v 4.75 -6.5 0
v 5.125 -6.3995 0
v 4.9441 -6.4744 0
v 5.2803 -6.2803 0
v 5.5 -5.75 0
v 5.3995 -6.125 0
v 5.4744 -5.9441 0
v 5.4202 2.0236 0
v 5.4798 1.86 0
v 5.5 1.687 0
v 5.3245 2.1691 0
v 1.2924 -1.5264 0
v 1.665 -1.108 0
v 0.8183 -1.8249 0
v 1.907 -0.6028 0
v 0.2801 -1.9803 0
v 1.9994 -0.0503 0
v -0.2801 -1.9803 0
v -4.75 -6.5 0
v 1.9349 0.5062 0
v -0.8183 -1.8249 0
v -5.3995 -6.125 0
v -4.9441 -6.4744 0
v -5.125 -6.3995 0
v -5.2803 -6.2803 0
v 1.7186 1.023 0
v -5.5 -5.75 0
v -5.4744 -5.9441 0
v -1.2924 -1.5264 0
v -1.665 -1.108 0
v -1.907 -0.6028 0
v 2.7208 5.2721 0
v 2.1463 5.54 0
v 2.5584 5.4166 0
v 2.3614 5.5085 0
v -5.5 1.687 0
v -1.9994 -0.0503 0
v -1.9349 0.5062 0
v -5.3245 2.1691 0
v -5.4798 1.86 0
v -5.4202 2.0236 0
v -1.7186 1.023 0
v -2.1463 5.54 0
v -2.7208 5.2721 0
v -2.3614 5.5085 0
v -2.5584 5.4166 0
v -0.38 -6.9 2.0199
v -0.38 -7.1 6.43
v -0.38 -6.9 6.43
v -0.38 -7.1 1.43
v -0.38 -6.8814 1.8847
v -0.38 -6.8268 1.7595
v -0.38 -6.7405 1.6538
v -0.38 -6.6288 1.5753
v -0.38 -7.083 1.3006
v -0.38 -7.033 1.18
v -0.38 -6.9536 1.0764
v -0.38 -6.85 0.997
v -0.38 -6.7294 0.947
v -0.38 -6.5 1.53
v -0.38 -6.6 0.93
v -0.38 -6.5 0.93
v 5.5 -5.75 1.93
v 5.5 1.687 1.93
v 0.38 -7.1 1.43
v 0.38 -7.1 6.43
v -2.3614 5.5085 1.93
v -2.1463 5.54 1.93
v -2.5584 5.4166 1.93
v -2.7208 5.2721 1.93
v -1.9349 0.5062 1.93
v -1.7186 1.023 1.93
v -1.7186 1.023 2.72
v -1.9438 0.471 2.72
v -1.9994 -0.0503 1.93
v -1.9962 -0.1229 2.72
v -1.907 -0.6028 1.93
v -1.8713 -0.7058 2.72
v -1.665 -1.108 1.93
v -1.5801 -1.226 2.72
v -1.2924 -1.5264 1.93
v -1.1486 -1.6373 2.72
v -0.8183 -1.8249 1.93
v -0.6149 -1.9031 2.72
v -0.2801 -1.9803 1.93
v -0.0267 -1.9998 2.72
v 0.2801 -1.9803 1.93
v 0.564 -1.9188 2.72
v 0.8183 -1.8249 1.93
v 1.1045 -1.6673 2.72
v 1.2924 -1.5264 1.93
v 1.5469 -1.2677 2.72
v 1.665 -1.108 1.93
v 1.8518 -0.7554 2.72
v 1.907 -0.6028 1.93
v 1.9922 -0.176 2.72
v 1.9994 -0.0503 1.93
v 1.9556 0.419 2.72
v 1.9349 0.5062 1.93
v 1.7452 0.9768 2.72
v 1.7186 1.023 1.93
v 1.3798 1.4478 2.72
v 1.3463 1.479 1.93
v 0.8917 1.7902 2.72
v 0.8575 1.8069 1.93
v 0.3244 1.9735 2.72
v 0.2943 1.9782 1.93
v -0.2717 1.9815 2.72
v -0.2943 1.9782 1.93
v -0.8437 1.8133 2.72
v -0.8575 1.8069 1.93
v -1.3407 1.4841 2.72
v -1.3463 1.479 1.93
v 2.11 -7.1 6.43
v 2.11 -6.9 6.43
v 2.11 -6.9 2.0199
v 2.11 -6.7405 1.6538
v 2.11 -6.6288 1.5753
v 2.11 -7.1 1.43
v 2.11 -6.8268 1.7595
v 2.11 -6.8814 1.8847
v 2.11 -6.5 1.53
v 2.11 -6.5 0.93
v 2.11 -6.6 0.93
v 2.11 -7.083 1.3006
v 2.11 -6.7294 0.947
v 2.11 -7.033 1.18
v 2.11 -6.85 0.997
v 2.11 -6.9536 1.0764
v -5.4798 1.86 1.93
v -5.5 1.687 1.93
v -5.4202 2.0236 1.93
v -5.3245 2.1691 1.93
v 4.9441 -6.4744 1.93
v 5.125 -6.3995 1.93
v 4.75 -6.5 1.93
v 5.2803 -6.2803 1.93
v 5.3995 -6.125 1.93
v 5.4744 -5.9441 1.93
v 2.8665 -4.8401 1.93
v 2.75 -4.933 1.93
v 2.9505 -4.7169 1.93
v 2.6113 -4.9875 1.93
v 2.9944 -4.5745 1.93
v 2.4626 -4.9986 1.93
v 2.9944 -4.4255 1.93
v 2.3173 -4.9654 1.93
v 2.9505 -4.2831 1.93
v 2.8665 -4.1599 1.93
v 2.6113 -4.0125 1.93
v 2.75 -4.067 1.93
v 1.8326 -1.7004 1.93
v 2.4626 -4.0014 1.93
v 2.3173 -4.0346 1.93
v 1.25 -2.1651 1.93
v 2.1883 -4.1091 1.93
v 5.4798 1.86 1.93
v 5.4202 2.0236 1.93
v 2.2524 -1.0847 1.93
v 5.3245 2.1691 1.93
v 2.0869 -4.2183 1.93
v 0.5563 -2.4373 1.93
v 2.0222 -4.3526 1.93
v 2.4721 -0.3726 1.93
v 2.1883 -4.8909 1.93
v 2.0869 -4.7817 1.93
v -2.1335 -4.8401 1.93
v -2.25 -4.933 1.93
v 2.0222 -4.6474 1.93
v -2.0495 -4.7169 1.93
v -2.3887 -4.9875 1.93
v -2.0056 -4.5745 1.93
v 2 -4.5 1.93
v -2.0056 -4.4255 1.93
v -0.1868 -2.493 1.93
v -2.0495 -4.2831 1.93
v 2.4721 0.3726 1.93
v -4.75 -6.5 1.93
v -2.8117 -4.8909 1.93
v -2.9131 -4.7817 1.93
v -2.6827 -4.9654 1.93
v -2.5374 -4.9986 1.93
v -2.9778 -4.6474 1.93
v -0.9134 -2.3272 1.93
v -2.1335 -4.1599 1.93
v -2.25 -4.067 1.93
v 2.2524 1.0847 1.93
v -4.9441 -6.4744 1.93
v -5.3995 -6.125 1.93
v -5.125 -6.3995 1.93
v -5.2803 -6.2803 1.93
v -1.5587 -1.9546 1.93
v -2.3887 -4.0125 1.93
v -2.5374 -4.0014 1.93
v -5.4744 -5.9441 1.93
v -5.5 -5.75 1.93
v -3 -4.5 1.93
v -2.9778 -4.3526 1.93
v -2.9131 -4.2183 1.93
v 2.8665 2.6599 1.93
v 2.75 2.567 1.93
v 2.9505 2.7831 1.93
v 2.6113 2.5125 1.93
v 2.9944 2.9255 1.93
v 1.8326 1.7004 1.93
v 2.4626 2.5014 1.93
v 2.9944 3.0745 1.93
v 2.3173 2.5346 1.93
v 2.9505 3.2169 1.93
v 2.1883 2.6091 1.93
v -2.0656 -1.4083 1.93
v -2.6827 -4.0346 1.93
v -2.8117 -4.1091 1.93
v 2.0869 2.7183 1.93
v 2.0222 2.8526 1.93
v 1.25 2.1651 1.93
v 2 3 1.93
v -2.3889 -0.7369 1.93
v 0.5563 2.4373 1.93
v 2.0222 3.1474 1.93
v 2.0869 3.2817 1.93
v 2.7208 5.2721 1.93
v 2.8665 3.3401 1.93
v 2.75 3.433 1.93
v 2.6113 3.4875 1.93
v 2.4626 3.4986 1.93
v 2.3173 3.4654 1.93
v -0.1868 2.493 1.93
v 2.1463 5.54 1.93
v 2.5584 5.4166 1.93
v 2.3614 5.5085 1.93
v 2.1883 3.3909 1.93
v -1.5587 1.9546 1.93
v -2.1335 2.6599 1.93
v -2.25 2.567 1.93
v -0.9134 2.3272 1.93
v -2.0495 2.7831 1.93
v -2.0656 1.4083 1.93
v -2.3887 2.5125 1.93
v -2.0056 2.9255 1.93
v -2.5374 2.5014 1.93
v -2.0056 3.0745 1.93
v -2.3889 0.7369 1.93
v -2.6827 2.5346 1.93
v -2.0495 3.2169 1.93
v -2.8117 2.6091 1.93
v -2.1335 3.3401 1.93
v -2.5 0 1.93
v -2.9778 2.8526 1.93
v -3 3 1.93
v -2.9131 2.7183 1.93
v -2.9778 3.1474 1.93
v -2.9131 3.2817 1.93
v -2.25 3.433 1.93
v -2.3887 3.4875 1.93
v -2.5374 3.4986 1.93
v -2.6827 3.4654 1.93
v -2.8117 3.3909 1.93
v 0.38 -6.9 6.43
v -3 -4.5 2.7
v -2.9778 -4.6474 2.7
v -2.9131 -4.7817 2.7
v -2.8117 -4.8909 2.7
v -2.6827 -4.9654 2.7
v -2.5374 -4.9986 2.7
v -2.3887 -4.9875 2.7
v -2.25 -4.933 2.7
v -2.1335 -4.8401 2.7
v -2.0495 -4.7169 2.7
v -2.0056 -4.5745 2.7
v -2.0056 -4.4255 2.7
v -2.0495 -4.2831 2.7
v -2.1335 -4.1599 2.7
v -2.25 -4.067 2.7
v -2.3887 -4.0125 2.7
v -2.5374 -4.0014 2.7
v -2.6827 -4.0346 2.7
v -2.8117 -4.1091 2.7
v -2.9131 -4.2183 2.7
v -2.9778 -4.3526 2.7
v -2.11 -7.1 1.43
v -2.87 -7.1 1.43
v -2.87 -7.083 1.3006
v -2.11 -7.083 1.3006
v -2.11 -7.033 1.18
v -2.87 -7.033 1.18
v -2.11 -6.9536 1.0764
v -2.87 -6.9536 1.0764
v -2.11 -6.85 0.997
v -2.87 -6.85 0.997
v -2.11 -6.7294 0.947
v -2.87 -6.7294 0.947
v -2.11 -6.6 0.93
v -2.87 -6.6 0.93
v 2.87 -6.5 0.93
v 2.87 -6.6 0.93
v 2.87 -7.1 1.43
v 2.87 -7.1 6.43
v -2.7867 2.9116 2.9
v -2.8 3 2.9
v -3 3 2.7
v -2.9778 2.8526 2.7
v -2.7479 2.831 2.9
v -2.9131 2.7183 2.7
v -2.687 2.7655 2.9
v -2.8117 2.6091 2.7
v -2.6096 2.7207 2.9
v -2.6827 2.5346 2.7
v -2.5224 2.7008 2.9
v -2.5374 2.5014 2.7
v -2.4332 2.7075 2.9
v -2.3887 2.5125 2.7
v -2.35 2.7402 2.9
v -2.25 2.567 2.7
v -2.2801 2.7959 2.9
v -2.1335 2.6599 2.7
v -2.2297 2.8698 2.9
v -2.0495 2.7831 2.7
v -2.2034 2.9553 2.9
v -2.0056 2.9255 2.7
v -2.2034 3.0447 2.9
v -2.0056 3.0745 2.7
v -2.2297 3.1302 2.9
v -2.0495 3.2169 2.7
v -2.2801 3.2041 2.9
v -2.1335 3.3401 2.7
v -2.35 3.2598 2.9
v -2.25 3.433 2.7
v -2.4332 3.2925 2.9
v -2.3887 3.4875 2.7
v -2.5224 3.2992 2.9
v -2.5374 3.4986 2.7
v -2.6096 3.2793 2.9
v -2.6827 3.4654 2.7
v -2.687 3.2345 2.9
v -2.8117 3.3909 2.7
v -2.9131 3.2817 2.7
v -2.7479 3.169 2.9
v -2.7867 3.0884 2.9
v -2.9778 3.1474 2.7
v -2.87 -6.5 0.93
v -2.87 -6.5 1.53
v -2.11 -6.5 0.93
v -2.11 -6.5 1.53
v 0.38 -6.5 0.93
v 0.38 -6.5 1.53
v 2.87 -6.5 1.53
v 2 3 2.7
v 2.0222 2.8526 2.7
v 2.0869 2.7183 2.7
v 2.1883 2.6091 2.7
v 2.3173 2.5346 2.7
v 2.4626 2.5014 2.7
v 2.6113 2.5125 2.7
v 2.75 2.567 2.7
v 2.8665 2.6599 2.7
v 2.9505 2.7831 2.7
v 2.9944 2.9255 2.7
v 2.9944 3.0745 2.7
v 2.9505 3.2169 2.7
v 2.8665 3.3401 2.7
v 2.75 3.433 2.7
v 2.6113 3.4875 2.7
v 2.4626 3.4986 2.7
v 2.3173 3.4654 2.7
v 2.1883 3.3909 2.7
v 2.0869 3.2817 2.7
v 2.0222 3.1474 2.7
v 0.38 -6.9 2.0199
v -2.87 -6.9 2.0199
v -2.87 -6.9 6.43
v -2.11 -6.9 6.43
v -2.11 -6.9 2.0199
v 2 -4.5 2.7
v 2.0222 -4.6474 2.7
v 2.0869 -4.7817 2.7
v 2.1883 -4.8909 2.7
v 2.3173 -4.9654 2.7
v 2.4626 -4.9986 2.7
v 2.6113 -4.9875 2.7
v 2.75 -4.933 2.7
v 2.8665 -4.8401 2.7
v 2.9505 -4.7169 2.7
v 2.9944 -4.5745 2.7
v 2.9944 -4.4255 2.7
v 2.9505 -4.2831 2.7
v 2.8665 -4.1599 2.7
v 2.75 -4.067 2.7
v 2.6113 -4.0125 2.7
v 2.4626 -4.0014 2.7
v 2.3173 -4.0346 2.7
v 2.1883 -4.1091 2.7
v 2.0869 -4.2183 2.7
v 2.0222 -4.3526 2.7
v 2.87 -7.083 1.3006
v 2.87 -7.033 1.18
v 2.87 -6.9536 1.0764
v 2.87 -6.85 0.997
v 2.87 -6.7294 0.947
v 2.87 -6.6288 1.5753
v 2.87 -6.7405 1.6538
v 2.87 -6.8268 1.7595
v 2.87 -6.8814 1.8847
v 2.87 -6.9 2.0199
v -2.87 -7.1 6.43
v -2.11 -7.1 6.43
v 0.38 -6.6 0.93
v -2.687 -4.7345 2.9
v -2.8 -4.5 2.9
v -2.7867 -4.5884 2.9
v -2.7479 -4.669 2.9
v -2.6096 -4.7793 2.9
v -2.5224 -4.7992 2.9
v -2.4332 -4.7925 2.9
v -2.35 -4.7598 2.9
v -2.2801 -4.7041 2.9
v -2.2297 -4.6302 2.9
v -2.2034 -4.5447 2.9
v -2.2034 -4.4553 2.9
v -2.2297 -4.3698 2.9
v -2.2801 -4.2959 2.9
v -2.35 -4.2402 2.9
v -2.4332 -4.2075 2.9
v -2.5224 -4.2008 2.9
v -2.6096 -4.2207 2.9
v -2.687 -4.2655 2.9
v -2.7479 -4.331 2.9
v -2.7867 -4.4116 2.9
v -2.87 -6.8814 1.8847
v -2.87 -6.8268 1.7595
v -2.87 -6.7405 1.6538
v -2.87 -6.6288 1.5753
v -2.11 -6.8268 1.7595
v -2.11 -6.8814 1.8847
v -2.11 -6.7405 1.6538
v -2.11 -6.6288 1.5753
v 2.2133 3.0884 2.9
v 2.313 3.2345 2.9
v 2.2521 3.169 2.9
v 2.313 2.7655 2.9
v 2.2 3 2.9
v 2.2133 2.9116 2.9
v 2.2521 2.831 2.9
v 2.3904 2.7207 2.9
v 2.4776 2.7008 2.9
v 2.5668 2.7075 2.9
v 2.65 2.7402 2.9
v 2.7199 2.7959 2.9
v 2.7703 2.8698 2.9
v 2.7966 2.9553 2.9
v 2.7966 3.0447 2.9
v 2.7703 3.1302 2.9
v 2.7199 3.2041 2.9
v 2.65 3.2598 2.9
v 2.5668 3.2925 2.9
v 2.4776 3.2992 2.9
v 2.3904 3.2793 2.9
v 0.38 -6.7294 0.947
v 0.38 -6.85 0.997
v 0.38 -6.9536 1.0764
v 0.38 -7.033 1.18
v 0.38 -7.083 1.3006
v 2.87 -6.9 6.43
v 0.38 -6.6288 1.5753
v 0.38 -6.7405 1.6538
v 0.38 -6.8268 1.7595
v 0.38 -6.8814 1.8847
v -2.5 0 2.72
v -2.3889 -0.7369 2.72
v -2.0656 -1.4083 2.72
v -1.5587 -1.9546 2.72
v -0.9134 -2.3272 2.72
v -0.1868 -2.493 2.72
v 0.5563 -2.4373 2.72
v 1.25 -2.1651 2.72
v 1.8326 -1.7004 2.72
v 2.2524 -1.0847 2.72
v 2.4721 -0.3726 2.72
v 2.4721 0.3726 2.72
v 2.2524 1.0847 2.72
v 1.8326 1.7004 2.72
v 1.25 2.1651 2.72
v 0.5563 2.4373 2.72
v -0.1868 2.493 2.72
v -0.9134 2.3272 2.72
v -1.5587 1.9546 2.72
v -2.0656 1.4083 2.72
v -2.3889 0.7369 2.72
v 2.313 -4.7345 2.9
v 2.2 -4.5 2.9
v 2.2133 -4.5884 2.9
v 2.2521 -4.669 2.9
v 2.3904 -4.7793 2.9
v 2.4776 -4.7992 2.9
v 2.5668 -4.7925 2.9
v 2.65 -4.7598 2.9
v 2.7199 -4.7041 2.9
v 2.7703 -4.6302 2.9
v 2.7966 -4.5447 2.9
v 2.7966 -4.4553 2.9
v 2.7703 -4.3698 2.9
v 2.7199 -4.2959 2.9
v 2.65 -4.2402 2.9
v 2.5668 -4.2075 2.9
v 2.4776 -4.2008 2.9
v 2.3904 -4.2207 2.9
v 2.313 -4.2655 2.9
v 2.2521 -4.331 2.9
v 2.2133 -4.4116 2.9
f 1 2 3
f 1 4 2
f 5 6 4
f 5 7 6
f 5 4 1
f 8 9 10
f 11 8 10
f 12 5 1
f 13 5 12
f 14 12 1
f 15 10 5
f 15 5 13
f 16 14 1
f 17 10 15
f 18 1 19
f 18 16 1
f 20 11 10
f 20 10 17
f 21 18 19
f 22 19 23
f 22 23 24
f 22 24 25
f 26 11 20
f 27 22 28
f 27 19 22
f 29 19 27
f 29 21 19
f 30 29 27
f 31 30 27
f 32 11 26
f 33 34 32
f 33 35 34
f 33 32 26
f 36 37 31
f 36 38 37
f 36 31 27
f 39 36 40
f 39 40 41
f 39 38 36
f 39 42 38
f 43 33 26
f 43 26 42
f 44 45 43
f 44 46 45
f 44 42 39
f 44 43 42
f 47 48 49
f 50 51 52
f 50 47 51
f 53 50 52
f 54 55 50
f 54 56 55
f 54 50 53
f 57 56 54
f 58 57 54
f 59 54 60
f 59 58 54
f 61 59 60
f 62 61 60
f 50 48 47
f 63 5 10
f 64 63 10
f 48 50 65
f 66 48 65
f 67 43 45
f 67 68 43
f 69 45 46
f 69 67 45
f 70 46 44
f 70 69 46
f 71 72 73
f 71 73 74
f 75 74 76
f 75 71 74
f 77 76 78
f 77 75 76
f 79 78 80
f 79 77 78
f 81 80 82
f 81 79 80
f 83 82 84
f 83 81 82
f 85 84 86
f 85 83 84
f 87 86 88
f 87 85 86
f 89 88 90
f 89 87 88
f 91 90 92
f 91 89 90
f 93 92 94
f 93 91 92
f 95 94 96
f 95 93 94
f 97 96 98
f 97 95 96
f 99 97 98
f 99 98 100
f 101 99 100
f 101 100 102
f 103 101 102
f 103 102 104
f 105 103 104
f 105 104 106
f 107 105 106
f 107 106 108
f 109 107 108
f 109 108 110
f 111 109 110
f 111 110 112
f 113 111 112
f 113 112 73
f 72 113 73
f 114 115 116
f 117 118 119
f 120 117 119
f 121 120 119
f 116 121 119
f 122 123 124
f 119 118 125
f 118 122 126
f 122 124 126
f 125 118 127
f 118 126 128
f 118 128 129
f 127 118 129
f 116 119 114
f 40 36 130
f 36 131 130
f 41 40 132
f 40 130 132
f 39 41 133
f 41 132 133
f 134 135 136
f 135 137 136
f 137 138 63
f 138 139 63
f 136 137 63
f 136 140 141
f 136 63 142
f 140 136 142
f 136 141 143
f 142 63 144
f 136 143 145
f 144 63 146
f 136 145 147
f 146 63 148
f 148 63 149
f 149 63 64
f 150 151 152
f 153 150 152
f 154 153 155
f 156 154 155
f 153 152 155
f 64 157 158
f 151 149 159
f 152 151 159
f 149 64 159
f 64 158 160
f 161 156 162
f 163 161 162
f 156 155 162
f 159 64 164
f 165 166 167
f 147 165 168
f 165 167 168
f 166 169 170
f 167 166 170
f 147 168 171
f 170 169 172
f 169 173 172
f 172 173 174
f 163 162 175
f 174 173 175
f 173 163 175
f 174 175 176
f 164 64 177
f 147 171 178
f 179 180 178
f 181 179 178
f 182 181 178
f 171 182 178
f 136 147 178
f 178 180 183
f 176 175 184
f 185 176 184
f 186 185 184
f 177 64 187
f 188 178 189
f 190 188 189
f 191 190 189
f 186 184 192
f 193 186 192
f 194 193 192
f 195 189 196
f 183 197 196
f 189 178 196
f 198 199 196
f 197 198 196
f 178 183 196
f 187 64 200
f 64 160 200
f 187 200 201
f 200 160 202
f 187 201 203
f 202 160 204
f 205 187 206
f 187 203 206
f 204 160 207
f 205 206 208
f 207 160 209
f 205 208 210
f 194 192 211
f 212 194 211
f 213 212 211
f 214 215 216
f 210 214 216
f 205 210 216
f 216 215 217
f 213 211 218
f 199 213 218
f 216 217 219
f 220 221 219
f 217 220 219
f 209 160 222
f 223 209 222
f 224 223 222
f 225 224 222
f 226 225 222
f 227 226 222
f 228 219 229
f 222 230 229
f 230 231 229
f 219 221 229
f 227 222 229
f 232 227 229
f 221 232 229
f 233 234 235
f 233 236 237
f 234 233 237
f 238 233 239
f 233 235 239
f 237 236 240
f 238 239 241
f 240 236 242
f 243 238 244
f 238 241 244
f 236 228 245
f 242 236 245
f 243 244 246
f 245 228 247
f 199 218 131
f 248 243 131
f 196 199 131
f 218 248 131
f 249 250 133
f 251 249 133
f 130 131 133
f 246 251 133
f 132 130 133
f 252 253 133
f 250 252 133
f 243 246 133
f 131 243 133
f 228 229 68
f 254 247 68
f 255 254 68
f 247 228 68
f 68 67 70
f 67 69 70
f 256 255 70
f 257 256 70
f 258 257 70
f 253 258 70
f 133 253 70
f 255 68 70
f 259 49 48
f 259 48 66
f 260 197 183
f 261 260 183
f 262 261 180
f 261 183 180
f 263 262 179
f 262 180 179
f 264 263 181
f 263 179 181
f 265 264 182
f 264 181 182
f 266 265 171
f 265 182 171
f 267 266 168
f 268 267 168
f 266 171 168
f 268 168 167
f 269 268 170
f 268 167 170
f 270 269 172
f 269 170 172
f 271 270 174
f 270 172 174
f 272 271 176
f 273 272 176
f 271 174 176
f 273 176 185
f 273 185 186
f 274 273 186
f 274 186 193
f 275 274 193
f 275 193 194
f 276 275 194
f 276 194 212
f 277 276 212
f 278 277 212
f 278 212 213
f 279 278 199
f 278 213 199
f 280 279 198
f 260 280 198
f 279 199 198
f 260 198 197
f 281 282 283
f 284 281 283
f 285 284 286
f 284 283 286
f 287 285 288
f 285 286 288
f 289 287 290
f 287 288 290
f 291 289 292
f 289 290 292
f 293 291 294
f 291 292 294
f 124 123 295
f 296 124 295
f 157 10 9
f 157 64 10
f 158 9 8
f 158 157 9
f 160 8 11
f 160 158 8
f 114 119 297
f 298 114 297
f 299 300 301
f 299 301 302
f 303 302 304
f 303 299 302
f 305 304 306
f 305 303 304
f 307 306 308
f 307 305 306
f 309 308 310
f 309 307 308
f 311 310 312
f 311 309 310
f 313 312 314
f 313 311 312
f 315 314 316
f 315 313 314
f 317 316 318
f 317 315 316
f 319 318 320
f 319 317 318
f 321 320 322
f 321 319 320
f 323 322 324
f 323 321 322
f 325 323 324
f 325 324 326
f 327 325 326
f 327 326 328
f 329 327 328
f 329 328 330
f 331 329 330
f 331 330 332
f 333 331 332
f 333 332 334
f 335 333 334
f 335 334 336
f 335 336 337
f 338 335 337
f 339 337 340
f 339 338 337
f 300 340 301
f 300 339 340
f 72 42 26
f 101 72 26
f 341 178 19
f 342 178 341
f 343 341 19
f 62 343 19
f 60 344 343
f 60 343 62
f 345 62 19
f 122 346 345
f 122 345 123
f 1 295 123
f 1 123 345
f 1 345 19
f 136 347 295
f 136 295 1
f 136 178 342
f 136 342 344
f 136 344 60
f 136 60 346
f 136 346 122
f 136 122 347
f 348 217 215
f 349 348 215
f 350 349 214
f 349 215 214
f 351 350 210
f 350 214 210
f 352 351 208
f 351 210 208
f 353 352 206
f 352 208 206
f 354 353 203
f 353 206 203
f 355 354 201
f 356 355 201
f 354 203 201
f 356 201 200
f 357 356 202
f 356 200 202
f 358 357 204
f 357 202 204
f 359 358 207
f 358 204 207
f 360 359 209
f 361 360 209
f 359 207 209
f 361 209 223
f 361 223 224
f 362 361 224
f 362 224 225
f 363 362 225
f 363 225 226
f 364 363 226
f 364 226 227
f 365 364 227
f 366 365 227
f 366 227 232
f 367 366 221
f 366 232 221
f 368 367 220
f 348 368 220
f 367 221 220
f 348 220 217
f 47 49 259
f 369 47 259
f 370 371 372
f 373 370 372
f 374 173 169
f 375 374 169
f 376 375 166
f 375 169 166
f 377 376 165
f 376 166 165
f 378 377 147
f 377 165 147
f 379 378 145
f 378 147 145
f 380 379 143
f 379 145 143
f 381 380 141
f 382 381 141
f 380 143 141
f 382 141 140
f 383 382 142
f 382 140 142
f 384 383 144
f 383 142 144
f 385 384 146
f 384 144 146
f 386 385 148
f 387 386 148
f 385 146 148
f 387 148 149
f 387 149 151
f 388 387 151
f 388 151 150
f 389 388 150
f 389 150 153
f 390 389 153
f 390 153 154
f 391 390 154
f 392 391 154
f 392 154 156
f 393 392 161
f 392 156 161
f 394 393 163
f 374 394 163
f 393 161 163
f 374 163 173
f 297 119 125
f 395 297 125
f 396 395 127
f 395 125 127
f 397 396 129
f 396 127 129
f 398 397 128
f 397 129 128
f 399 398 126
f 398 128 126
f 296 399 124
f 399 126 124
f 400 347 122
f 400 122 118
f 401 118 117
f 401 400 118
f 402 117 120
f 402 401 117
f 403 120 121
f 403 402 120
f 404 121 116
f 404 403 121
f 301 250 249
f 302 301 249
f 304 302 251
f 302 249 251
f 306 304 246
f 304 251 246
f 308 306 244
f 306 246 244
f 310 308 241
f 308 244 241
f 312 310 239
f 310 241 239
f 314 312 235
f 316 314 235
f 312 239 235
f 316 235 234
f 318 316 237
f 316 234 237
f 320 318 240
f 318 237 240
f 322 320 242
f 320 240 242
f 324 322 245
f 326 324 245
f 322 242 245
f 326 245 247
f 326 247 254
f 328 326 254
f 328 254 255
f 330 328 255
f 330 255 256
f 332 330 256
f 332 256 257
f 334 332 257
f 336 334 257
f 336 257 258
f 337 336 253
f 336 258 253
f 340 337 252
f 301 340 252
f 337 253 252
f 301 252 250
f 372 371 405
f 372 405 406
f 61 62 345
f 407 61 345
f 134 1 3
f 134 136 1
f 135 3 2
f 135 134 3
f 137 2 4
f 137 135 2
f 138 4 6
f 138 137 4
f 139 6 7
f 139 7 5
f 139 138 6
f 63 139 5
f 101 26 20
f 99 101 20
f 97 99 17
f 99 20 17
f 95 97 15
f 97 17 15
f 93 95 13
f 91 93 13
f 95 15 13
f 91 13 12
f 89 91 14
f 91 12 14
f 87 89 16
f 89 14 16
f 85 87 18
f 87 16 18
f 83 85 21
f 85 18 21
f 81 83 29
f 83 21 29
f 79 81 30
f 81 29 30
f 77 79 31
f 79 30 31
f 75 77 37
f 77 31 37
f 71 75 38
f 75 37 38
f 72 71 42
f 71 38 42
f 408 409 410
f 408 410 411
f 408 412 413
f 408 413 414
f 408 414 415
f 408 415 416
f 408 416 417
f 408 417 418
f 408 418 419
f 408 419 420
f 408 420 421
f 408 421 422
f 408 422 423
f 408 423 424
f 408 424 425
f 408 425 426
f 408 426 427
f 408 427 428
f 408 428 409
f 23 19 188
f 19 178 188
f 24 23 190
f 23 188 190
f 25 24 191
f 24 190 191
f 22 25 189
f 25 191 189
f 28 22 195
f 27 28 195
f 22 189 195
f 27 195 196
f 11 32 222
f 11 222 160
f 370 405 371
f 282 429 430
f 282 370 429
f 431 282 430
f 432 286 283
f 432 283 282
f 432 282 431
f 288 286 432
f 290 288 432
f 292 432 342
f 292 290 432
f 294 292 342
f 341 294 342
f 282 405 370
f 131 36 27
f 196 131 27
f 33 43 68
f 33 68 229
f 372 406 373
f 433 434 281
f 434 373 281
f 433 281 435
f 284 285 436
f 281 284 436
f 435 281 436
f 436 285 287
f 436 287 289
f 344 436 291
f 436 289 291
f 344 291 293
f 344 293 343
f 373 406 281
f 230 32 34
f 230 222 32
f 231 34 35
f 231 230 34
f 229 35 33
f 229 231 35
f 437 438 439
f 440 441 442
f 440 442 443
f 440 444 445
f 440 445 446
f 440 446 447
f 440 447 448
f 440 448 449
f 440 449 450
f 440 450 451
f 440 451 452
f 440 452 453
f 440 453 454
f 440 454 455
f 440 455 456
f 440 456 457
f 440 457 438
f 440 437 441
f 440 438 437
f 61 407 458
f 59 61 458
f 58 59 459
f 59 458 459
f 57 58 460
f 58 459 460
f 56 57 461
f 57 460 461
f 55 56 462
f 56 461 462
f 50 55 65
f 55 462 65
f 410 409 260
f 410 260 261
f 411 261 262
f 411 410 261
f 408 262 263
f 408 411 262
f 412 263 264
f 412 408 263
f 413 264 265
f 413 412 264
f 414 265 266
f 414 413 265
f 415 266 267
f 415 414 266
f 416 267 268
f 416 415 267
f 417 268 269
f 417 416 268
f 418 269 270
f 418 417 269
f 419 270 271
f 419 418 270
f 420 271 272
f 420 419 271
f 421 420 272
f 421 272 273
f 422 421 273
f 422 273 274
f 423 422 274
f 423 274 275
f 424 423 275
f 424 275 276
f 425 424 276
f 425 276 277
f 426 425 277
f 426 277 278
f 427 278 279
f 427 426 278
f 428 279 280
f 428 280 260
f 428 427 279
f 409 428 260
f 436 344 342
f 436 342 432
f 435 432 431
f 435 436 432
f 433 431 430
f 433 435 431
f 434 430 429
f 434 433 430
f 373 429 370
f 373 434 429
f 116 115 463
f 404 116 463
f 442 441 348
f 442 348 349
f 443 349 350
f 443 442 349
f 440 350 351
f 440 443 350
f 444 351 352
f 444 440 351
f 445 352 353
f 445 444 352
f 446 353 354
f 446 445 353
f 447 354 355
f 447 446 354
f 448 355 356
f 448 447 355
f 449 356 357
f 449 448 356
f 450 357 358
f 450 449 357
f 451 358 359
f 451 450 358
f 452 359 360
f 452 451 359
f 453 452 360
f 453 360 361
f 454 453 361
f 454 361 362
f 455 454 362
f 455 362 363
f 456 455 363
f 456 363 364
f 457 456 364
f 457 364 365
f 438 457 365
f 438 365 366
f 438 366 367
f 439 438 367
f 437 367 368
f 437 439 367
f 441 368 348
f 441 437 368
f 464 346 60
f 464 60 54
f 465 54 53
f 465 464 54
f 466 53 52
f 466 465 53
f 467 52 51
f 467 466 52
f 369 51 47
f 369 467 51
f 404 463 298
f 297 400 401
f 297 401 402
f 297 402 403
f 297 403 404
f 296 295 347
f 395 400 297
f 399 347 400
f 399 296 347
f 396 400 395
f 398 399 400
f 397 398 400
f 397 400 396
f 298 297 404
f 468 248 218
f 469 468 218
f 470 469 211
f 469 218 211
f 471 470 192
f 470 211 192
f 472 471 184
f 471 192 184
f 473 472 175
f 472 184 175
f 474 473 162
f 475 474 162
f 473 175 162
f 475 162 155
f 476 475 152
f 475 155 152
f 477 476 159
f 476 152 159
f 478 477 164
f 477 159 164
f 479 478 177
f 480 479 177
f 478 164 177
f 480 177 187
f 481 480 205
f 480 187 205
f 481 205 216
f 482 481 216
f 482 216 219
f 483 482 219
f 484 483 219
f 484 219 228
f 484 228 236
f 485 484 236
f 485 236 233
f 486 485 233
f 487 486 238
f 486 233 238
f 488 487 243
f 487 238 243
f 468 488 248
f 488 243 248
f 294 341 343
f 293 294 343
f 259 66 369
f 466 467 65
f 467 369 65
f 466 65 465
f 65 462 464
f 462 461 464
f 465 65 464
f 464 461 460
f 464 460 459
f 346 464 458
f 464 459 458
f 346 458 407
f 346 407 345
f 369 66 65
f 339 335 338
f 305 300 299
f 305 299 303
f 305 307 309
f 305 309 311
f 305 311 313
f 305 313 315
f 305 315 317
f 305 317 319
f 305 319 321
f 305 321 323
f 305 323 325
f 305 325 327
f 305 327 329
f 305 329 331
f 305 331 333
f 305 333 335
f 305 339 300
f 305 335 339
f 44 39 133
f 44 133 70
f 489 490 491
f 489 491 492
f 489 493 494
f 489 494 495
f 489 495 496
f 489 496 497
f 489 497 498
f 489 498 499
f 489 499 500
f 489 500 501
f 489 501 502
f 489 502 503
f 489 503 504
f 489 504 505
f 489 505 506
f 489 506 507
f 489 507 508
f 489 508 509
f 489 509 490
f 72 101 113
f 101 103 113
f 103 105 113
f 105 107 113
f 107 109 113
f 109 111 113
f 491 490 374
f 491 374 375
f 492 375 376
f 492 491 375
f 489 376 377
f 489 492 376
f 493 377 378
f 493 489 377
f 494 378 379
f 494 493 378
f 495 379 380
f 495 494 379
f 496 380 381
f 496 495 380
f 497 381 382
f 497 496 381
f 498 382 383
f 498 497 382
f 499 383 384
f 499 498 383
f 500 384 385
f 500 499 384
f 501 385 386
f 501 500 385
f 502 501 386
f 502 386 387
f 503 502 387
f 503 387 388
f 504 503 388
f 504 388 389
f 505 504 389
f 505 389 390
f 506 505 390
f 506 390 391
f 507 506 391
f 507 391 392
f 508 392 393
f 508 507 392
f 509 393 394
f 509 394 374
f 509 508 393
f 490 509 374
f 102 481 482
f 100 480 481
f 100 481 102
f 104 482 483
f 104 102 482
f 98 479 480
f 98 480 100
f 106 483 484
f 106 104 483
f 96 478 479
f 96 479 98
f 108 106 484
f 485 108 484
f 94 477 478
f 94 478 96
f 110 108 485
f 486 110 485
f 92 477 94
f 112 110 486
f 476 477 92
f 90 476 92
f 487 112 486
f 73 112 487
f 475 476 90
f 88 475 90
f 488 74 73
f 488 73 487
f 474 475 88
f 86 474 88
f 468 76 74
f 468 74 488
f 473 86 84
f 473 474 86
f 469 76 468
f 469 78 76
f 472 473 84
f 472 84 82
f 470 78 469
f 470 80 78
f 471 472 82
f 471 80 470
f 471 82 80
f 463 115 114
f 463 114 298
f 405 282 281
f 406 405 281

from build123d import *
from build123d.topology import SkipClean

# Parameters (mm, degrees)
BOSS_EXTRUDE1_DEPTH      = 1.93
SKETCH2_R                = 2.5
SKETCH2_R_2              = 2
BOSS_EXTRUDE2_DEPTH      = 0.79
BOSS_EXTRUDE3_DEPTH      = 4.5
BOSS_EXTRUDE3_DEPTH_BACK = 1
SKETCH3_W                = 0.76
SKETCH3_H                = 0.6
FILLET2_R                = 0.75
SKETCH4_W                = 5.74
SKETCH4_H                = 0.4
CUT_EXTRUDE1_DEPTH       = 4.9
FILLET1_R                = 0.5
SKETCH5_R                = 0.5
BOSS_EXTRUDE4_DEPTH      = 0.97
CHAMFER1_SIZE            = 0.2


with BuildPart() as part:
    # Sketch1 → Boss-Extrude1 (new body)
    with BuildSketch(Plane.XY):
        Polygon((5.5, 0), (5.5, -6.5), (-5.5, -6.5), (-5.5, 0), (-5.5, 1.96), (-2.49602332, 5.54), (2.49602332, 5.54), (5.5, 1.96), align=None)
        with BuildLine():
            Line((-1.718566554, 1.023), (1.718566554, 1.023))
            ThreePointArc((1.718566554, 1.023), (0, -2), (-1.718566554, 1.023))
        make_face(mode=Mode.SUBTRACT)
    extrude(amount=BOSS_EXTRUDE1_DEPTH)

    # Sketch2 → Boss-Extrude2 (add)
    with SkipClean():  # the faces are left unmerged after this step: merging them gives an invalid solid
        with BuildSketch(Plane.XY.offset(1.93)):
            with Locations(Location((0, 0, 0), (0, 0, 180))):
                Circle(SKETCH2_R)
            with Locations(Location((0, 0, 0), (0, 0, 149.236204264))):
                Circle(SKETCH2_R_2, mode=Mode.SUBTRACT)
        extrude(amount=BOSS_EXTRUDE2_DEPTH)

    # Sketch3 → Boss-Extrude3 (add, two sides: drawn at the far end of the back side and taken through both)
    with SkipClean():  # the faces are left unmerged after this step: merging them gives an invalid solid
        with BuildSketch(Plane.XY.offset(1.93).offset(-BOSS_EXTRUDE3_DEPTH_BACK)):
            with Locations((0, -6.8)):
                Rectangle(SKETCH3_W, SKETCH3_H)
            with Locations((2.49, -6.8)):
                Rectangle(SKETCH3_W, SKETCH3_H)
            with Locations((-2.49, -6.8)):
                Rectangle(SKETCH3_W, SKETCH3_H)
        extrude(amount=BOSS_EXTRUDE3_DEPTH + BOSS_EXTRUDE3_DEPTH_BACK)

    # Fillet2
    fillet2_edges = [part.edges().sort_by_distance(p)[0] for p in [
        (5.5, -6.5, 0.965),
        (-5.5, -6.5, 0.965),
        (-5.5, 1.96, 0.965),
        (-2.49602332, 5.54, 0.965),
        (2.49602332, 5.54, 0.965),
        (5.5, 1.96, 0.965),
    ]]
    fillet(fillet2_edges, radius=FILLET2_R)

    # Sketch4 → Cut-Extrude1 (cut)
    with SkipClean():  # the faces are left unmerged after this step: merging them gives an invalid solid
        with BuildSketch(Plane.XY.offset(6.43)):
            with Locations((0, -6.7)):
                Rectangle(SKETCH4_W, SKETCH4_H)
        extrude(amount=-CUT_EXTRUDE1_DEPTH, mode=Mode.SUBTRACT)

    # Fillet1
    # the kernel refuses this fillet: 0.5 mm, written as the material it adds along each edge
    with BuildSketch(Plane(origin=(2.87, -6.9, 1.53), x_dir=(0, 1.0, 1.5715206913564052e-12), z_dir=(-1, 0, 0)), Plane(origin=(0.38, -6.9, 1.53), x_dir=(0, 1.0, 1.5715206913564052e-12), z_dir=(-1, 0, 0)), Plane(origin=(-2.11, -6.9, 1.53), x_dir=(0, 1.0, 1.5715206913564052e-12), z_dir=(-1, 0, 0))) as fillet1_piece_1:
        with BuildLine():
            CenterArc((0.5, -0.489897949), FILLET1_R, 101.536959033, 78.463040967)
            Line((0, -0.489897949), (0, 0))
            Line((0, 0), (0.4, 0))
        make_face()
    extrude(amount=0.76)
    # the kernel refuses this fillet: 0.5 mm, written as the material it takes off along each edge
    with BuildSketch(Plane(origin=(0.86, -7.1, 0.93), x_dir=(0, 1, 0), z_dir=(1, 0, 0)), Plane(origin=(-4.12, -7.1, 0.93), x_dir=(0, 1, 0), z_dir=(1, 0, 0))) as fillet1_2_piece_1:
        with BuildLine():
            CenterArc((FILLET1_R, FILLET1_R), FILLET1_R, 180, 90)
            Line((0, FILLET1_R), (0, 0))
            Line((0, 0), (FILLET1_R, 0))
        make_face()
    extrude(amount=3.26, mode=Mode.SUBTRACT)
    with BuildSketch(Plane(origin=(1.63, -7.1, 0.93), x_dir=(0, 1, 0), z_dir=(-1, 0, 0))) as fillet1_2_piece_2:
        with BuildLine():
            CenterArc((FILLET1_R, -FILLET1_R), FILLET1_R, 90, 90)
            Line((0, -FILLET1_R), (0, 0))
            Line((0, 0), (FILLET1_R, 0))
        make_face()
    extrude(amount=3.26, mode=Mode.SUBTRACT)

    # Sketch5 → Boss-Extrude4 (add)
    with BuildSketch(Plane.XY.offset(1.93)):
        with Locations(Location((-2.5, -4.5, 0), (0, 0, 180))):
            Circle(SKETCH5_R)
        with Locations(Location((2.5, -4.5, 0), (0, 0, 180))):
            Circle(SKETCH5_R)
        with Locations(Location((2.5, 3, 0), (0, 0, 180))):
            Circle(SKETCH5_R)
        with Locations(Location((-2.5, 3, 0), (0, 0, 180))):
            Circle(SKETCH5_R)
    extrude(amount=BOSS_EXTRUDE4_DEPTH)

    # Chamfer1
    chamfer1_edges = [part.edges().sort_by_distance(p)[0] for p in [
        (3, -4.5, 2.9),
        (-2, -4.5, 2.9),
        (3, 3, 2.9),
        (-2, 3, 2.9),
    ]]
    chamfer(chamfer1_edges, length=CHAMFER1_SIZE)


solid = part.part
